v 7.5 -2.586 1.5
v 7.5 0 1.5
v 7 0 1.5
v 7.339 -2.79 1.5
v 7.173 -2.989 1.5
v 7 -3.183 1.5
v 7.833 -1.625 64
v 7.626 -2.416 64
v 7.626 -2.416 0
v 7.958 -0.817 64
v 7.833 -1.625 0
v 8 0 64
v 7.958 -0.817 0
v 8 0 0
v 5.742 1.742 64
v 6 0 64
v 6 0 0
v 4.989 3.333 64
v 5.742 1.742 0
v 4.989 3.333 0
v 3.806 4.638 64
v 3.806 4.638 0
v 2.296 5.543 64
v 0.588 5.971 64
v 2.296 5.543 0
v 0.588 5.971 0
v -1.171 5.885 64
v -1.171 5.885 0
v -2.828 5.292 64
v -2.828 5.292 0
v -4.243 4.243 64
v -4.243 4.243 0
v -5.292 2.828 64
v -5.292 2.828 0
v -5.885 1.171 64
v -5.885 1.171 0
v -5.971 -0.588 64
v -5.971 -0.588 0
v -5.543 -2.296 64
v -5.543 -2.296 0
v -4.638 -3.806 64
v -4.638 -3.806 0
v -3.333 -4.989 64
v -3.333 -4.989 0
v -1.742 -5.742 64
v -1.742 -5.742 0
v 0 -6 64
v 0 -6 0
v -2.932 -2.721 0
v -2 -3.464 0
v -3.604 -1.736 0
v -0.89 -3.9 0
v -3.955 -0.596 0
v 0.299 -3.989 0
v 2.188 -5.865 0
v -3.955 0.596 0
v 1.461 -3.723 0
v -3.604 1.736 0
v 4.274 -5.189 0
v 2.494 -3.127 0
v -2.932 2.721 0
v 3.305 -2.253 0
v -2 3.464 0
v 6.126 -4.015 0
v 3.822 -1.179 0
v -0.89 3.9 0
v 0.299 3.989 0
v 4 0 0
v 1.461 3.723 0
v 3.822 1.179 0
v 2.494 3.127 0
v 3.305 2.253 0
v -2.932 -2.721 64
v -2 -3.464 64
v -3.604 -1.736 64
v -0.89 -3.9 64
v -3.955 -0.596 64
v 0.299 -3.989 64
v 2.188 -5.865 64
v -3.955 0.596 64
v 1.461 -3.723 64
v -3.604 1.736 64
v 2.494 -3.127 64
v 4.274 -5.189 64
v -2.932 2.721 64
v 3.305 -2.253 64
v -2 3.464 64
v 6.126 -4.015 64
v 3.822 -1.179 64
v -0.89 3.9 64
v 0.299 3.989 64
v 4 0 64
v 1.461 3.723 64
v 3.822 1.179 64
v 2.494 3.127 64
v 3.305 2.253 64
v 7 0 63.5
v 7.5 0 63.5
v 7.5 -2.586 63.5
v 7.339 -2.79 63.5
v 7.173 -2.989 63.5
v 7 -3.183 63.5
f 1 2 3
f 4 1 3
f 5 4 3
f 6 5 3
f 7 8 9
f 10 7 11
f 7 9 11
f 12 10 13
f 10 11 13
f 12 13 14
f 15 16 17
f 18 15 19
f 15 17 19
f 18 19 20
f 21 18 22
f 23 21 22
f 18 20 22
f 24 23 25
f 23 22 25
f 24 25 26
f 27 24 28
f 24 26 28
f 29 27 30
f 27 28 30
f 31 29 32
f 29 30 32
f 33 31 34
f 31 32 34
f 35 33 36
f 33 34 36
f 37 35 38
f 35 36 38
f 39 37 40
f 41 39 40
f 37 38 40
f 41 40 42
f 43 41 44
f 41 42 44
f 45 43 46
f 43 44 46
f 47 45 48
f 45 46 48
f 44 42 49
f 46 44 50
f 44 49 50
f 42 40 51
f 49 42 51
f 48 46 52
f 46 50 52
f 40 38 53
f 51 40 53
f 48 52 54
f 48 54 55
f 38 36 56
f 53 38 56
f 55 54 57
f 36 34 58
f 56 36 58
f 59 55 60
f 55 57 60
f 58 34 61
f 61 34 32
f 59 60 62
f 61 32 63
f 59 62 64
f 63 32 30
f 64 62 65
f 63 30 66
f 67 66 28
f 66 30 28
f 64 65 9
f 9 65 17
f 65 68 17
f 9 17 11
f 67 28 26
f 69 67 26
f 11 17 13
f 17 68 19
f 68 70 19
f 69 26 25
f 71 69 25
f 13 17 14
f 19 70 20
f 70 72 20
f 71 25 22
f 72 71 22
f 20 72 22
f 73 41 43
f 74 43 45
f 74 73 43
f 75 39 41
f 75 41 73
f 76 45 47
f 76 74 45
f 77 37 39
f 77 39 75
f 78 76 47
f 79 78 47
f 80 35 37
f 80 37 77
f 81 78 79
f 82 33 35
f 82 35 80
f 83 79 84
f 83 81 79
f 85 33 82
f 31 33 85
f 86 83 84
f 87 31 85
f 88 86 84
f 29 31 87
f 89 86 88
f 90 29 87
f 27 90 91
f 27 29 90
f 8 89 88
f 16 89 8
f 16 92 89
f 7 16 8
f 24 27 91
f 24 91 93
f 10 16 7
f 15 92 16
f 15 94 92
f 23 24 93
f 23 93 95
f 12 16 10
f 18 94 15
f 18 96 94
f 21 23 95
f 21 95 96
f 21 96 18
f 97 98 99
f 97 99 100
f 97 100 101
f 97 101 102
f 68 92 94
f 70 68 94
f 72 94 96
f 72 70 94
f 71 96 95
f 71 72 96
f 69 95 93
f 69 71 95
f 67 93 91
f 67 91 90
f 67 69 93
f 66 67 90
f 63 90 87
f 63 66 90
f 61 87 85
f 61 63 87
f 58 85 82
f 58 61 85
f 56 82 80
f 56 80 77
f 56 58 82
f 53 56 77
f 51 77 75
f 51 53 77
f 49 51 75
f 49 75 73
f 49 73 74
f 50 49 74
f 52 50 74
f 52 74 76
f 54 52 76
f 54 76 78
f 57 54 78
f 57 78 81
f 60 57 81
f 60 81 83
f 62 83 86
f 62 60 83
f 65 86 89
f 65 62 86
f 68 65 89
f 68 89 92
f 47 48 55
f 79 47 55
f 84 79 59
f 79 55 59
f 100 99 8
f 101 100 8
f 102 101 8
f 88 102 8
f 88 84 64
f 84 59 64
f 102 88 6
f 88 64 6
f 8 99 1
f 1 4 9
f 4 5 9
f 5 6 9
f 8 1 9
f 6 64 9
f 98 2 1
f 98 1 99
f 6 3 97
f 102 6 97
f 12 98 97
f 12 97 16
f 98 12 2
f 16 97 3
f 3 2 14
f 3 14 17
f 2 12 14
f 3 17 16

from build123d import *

# Parameters (mm, degrees)
F0_R     = 4
F1_DEPTH = 64
F2_DEPTH = 64
F3_W     = 0.5
F3_H     = 62
F4_DEPTH = 25


with BuildPart() as f1:
    # F0 (on Top) → F1 (new body)
    with BuildSketch(Plane.XY):
        with BuildLine():
            ThreePointArc((0, -6), (4.242641, -4.242641), (6, 0))
            ThreePointArc((6, 0), (-4.242641, 4.242641), (0, -6))
        make_face()
        Circle(F0_R, mode=Mode.SUBTRACT)
    extrude(amount=F1_DEPTH)

    # F0 (on Top) → F2 (join)
    with BuildSketch(Plane.XY):
        with BuildLine():
            Line((8, 0), (6, 0))
            ThreePointArc((6, 0), (4.242641, -4.242641), (0, -6))
            ThreePointArc((0, -6), (4.274303, -5.189002), (7.626499, -2.415889))
            ThreePointArc((7.626499, -2.415889), (7.906073, -1.222295), (8, 0))
        make_face()
    extrude(amount=F2_DEPTH)

    # F3 (on face) → F4 (cut)
    with BuildSketch(Plane(origin=(0, 0, 0), x_dir=(-1, 0, 0), z_dir=(0, 1, 0))):
        with Locations((-7.25, 32.5)):
            Rectangle(F3_W, F3_H)
    extrude(amount=-F4_DEPTH, mode=Mode.SUBTRACT)


solid = f1.part
